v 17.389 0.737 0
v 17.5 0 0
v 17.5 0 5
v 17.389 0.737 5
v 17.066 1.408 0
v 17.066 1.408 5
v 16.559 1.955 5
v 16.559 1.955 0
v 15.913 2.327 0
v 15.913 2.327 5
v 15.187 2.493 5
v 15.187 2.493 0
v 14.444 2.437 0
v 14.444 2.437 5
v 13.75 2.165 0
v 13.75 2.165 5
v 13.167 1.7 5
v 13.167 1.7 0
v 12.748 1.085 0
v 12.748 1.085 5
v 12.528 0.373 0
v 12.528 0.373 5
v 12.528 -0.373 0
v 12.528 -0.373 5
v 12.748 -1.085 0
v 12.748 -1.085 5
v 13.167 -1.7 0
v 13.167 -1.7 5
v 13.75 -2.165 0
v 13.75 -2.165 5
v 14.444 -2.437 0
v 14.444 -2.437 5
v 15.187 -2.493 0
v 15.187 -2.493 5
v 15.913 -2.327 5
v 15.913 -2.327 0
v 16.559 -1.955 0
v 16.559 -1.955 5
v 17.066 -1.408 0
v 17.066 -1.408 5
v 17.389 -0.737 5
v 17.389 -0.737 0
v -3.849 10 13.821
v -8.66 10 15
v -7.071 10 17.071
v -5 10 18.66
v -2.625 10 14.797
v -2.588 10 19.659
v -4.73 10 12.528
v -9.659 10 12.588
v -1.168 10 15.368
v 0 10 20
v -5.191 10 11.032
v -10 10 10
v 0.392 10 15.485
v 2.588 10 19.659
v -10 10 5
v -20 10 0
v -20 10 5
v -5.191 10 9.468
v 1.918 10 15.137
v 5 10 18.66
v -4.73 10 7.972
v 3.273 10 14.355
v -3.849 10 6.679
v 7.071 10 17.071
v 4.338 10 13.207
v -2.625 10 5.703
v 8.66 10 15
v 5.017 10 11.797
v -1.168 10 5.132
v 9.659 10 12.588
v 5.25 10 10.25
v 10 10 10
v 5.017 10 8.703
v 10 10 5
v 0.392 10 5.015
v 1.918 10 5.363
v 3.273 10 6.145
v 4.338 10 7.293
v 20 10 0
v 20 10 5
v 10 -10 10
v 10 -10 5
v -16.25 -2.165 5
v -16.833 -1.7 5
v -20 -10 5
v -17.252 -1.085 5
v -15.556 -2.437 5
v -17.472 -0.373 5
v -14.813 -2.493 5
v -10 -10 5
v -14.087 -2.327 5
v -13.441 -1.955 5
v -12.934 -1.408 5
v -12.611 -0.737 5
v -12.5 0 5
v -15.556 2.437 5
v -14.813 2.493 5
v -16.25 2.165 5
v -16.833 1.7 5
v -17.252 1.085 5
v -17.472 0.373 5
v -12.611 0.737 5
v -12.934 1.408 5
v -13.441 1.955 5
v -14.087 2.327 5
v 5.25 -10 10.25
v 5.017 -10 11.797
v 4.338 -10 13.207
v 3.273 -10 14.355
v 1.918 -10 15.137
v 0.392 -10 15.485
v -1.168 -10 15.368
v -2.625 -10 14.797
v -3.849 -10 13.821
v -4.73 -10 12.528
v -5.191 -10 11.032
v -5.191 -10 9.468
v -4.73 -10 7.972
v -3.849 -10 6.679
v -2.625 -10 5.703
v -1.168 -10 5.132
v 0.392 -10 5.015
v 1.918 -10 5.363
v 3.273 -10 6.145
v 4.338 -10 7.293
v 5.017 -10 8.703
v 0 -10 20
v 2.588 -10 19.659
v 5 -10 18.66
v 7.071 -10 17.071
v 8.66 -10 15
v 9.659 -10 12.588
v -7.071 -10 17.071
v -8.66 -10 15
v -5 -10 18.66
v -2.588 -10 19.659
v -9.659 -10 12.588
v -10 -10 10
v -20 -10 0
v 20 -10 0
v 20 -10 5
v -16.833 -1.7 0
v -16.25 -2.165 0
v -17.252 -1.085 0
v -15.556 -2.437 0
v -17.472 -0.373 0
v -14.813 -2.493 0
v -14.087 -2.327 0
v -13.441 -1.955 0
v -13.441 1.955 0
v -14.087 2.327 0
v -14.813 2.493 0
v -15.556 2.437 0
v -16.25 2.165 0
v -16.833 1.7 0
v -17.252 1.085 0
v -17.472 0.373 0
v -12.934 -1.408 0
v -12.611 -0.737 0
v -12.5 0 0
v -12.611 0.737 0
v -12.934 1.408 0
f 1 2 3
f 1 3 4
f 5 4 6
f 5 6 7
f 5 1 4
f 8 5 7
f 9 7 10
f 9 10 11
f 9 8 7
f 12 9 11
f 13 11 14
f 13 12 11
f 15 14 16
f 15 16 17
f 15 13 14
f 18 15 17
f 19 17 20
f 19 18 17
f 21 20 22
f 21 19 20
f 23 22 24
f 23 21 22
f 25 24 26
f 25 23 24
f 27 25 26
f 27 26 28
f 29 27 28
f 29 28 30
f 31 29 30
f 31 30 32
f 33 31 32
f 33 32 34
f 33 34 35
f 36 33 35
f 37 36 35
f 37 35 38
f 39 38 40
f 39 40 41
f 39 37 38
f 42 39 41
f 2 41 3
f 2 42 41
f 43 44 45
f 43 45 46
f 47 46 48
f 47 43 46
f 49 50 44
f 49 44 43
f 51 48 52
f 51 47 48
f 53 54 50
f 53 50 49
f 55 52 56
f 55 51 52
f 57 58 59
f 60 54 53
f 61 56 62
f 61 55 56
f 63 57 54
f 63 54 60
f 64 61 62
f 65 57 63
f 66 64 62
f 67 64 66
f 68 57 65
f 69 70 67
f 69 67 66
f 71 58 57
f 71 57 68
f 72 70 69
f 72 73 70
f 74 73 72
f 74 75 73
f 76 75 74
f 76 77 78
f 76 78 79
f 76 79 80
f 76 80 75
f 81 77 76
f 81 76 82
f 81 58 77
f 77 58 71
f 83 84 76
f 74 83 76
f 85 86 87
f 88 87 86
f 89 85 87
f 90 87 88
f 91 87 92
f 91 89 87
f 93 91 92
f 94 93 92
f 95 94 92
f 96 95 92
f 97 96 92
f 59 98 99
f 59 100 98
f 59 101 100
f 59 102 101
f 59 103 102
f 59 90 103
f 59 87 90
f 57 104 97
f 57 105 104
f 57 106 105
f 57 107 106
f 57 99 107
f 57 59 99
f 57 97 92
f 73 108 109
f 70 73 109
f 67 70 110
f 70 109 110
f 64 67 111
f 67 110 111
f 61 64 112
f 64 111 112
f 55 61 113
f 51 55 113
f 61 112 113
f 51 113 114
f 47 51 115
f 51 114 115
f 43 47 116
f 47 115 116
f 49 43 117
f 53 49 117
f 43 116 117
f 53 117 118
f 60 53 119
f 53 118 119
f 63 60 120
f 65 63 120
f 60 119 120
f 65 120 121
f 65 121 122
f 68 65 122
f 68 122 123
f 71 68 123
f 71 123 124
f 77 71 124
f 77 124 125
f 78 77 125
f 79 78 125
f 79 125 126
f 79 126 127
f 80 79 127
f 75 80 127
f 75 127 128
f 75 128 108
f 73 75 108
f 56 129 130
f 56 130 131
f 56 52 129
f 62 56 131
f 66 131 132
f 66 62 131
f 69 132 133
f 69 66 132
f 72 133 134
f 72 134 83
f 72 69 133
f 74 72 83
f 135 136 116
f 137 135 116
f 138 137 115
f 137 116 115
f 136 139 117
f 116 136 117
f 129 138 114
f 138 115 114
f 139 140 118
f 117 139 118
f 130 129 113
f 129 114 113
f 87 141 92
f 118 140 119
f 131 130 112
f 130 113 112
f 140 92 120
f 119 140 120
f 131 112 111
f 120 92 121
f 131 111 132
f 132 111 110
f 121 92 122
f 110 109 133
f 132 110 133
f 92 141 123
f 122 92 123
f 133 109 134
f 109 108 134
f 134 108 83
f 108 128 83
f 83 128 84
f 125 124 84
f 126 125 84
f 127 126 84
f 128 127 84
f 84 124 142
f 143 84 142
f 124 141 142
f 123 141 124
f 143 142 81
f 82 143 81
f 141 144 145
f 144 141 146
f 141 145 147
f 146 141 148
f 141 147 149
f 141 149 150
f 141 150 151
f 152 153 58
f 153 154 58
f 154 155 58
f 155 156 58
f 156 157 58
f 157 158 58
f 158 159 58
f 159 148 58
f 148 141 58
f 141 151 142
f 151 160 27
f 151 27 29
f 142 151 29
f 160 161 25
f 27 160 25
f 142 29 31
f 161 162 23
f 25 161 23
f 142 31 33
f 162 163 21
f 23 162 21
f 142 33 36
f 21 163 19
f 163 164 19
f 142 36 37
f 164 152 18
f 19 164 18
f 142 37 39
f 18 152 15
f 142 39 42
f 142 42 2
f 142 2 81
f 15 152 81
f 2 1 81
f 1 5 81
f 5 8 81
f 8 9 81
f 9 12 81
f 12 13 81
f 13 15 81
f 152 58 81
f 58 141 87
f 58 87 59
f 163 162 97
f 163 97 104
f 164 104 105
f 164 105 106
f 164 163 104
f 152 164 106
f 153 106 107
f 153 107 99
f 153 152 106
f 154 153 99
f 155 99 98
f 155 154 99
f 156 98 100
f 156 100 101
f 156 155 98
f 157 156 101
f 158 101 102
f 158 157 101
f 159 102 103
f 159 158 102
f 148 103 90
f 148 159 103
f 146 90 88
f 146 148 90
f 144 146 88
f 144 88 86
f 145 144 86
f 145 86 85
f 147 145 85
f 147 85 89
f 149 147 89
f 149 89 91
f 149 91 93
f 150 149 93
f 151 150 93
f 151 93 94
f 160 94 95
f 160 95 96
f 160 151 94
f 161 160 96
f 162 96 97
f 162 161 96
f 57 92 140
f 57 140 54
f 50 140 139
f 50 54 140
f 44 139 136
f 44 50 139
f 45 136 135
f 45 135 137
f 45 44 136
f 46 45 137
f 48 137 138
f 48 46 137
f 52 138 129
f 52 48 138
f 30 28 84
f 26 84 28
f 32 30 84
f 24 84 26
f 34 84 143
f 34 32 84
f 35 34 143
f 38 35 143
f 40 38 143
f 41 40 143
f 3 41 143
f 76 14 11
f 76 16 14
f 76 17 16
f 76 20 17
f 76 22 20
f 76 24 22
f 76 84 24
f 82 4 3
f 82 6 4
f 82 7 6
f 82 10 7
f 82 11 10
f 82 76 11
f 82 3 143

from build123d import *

# Parameters (mm, degrees)
F0_W     = 40
F0_H     = 20
F0_R     = 2.5
F1_DEPTH = 5
F2_W     = 20
F2_H     = 20
F3_DEPTH = 15
F4_R     = 5.25
F5_DEPTH = 25
F6_R     = 9.99999


# Not quite as in the source:
# - a fillet or chamfer is up to 0.001 mm smaller than in the source, because OpenCascade refuses the exact size


with BuildPart() as f1:
    # F0 (on Top) → F1 (new body)
    with BuildSketch(Plane.XY):
        Rectangle(F0_W, F0_H)
        with Locations((-15, 0)):
            Circle(F0_R, mode=Mode.SUBTRACT)
        with Locations((15, 0)):
            Circle(F0_R, mode=Mode.SUBTRACT)
    extrude(amount=F1_DEPTH)

    # F2 (on face) → F3 (join)
    with BuildSketch(Plane.XY.offset(5)):
        Rectangle(F2_W, F2_H)
    extrude(amount=F3_DEPTH)

    # F4 (on face) → F5 (cut)
    with BuildSketch(Plane.XZ.offset(10)):
        with Locations((0, 10.25)):
            Circle(F4_R)
    extrude(amount=-F5_DEPTH, mode=Mode.SUBTRACT)

    # F6 (radius 10 in the source; OpenCascade refuses exactly that, so slightly less here)
    f6_edges = [f1.edges().sort_by_distance(p)[0] for p in [
        (-10, 0, 20),
        (10, 0, 20),
    ]]
    fillet(f6_edges, radius=F6_R)


solid = f1.part
